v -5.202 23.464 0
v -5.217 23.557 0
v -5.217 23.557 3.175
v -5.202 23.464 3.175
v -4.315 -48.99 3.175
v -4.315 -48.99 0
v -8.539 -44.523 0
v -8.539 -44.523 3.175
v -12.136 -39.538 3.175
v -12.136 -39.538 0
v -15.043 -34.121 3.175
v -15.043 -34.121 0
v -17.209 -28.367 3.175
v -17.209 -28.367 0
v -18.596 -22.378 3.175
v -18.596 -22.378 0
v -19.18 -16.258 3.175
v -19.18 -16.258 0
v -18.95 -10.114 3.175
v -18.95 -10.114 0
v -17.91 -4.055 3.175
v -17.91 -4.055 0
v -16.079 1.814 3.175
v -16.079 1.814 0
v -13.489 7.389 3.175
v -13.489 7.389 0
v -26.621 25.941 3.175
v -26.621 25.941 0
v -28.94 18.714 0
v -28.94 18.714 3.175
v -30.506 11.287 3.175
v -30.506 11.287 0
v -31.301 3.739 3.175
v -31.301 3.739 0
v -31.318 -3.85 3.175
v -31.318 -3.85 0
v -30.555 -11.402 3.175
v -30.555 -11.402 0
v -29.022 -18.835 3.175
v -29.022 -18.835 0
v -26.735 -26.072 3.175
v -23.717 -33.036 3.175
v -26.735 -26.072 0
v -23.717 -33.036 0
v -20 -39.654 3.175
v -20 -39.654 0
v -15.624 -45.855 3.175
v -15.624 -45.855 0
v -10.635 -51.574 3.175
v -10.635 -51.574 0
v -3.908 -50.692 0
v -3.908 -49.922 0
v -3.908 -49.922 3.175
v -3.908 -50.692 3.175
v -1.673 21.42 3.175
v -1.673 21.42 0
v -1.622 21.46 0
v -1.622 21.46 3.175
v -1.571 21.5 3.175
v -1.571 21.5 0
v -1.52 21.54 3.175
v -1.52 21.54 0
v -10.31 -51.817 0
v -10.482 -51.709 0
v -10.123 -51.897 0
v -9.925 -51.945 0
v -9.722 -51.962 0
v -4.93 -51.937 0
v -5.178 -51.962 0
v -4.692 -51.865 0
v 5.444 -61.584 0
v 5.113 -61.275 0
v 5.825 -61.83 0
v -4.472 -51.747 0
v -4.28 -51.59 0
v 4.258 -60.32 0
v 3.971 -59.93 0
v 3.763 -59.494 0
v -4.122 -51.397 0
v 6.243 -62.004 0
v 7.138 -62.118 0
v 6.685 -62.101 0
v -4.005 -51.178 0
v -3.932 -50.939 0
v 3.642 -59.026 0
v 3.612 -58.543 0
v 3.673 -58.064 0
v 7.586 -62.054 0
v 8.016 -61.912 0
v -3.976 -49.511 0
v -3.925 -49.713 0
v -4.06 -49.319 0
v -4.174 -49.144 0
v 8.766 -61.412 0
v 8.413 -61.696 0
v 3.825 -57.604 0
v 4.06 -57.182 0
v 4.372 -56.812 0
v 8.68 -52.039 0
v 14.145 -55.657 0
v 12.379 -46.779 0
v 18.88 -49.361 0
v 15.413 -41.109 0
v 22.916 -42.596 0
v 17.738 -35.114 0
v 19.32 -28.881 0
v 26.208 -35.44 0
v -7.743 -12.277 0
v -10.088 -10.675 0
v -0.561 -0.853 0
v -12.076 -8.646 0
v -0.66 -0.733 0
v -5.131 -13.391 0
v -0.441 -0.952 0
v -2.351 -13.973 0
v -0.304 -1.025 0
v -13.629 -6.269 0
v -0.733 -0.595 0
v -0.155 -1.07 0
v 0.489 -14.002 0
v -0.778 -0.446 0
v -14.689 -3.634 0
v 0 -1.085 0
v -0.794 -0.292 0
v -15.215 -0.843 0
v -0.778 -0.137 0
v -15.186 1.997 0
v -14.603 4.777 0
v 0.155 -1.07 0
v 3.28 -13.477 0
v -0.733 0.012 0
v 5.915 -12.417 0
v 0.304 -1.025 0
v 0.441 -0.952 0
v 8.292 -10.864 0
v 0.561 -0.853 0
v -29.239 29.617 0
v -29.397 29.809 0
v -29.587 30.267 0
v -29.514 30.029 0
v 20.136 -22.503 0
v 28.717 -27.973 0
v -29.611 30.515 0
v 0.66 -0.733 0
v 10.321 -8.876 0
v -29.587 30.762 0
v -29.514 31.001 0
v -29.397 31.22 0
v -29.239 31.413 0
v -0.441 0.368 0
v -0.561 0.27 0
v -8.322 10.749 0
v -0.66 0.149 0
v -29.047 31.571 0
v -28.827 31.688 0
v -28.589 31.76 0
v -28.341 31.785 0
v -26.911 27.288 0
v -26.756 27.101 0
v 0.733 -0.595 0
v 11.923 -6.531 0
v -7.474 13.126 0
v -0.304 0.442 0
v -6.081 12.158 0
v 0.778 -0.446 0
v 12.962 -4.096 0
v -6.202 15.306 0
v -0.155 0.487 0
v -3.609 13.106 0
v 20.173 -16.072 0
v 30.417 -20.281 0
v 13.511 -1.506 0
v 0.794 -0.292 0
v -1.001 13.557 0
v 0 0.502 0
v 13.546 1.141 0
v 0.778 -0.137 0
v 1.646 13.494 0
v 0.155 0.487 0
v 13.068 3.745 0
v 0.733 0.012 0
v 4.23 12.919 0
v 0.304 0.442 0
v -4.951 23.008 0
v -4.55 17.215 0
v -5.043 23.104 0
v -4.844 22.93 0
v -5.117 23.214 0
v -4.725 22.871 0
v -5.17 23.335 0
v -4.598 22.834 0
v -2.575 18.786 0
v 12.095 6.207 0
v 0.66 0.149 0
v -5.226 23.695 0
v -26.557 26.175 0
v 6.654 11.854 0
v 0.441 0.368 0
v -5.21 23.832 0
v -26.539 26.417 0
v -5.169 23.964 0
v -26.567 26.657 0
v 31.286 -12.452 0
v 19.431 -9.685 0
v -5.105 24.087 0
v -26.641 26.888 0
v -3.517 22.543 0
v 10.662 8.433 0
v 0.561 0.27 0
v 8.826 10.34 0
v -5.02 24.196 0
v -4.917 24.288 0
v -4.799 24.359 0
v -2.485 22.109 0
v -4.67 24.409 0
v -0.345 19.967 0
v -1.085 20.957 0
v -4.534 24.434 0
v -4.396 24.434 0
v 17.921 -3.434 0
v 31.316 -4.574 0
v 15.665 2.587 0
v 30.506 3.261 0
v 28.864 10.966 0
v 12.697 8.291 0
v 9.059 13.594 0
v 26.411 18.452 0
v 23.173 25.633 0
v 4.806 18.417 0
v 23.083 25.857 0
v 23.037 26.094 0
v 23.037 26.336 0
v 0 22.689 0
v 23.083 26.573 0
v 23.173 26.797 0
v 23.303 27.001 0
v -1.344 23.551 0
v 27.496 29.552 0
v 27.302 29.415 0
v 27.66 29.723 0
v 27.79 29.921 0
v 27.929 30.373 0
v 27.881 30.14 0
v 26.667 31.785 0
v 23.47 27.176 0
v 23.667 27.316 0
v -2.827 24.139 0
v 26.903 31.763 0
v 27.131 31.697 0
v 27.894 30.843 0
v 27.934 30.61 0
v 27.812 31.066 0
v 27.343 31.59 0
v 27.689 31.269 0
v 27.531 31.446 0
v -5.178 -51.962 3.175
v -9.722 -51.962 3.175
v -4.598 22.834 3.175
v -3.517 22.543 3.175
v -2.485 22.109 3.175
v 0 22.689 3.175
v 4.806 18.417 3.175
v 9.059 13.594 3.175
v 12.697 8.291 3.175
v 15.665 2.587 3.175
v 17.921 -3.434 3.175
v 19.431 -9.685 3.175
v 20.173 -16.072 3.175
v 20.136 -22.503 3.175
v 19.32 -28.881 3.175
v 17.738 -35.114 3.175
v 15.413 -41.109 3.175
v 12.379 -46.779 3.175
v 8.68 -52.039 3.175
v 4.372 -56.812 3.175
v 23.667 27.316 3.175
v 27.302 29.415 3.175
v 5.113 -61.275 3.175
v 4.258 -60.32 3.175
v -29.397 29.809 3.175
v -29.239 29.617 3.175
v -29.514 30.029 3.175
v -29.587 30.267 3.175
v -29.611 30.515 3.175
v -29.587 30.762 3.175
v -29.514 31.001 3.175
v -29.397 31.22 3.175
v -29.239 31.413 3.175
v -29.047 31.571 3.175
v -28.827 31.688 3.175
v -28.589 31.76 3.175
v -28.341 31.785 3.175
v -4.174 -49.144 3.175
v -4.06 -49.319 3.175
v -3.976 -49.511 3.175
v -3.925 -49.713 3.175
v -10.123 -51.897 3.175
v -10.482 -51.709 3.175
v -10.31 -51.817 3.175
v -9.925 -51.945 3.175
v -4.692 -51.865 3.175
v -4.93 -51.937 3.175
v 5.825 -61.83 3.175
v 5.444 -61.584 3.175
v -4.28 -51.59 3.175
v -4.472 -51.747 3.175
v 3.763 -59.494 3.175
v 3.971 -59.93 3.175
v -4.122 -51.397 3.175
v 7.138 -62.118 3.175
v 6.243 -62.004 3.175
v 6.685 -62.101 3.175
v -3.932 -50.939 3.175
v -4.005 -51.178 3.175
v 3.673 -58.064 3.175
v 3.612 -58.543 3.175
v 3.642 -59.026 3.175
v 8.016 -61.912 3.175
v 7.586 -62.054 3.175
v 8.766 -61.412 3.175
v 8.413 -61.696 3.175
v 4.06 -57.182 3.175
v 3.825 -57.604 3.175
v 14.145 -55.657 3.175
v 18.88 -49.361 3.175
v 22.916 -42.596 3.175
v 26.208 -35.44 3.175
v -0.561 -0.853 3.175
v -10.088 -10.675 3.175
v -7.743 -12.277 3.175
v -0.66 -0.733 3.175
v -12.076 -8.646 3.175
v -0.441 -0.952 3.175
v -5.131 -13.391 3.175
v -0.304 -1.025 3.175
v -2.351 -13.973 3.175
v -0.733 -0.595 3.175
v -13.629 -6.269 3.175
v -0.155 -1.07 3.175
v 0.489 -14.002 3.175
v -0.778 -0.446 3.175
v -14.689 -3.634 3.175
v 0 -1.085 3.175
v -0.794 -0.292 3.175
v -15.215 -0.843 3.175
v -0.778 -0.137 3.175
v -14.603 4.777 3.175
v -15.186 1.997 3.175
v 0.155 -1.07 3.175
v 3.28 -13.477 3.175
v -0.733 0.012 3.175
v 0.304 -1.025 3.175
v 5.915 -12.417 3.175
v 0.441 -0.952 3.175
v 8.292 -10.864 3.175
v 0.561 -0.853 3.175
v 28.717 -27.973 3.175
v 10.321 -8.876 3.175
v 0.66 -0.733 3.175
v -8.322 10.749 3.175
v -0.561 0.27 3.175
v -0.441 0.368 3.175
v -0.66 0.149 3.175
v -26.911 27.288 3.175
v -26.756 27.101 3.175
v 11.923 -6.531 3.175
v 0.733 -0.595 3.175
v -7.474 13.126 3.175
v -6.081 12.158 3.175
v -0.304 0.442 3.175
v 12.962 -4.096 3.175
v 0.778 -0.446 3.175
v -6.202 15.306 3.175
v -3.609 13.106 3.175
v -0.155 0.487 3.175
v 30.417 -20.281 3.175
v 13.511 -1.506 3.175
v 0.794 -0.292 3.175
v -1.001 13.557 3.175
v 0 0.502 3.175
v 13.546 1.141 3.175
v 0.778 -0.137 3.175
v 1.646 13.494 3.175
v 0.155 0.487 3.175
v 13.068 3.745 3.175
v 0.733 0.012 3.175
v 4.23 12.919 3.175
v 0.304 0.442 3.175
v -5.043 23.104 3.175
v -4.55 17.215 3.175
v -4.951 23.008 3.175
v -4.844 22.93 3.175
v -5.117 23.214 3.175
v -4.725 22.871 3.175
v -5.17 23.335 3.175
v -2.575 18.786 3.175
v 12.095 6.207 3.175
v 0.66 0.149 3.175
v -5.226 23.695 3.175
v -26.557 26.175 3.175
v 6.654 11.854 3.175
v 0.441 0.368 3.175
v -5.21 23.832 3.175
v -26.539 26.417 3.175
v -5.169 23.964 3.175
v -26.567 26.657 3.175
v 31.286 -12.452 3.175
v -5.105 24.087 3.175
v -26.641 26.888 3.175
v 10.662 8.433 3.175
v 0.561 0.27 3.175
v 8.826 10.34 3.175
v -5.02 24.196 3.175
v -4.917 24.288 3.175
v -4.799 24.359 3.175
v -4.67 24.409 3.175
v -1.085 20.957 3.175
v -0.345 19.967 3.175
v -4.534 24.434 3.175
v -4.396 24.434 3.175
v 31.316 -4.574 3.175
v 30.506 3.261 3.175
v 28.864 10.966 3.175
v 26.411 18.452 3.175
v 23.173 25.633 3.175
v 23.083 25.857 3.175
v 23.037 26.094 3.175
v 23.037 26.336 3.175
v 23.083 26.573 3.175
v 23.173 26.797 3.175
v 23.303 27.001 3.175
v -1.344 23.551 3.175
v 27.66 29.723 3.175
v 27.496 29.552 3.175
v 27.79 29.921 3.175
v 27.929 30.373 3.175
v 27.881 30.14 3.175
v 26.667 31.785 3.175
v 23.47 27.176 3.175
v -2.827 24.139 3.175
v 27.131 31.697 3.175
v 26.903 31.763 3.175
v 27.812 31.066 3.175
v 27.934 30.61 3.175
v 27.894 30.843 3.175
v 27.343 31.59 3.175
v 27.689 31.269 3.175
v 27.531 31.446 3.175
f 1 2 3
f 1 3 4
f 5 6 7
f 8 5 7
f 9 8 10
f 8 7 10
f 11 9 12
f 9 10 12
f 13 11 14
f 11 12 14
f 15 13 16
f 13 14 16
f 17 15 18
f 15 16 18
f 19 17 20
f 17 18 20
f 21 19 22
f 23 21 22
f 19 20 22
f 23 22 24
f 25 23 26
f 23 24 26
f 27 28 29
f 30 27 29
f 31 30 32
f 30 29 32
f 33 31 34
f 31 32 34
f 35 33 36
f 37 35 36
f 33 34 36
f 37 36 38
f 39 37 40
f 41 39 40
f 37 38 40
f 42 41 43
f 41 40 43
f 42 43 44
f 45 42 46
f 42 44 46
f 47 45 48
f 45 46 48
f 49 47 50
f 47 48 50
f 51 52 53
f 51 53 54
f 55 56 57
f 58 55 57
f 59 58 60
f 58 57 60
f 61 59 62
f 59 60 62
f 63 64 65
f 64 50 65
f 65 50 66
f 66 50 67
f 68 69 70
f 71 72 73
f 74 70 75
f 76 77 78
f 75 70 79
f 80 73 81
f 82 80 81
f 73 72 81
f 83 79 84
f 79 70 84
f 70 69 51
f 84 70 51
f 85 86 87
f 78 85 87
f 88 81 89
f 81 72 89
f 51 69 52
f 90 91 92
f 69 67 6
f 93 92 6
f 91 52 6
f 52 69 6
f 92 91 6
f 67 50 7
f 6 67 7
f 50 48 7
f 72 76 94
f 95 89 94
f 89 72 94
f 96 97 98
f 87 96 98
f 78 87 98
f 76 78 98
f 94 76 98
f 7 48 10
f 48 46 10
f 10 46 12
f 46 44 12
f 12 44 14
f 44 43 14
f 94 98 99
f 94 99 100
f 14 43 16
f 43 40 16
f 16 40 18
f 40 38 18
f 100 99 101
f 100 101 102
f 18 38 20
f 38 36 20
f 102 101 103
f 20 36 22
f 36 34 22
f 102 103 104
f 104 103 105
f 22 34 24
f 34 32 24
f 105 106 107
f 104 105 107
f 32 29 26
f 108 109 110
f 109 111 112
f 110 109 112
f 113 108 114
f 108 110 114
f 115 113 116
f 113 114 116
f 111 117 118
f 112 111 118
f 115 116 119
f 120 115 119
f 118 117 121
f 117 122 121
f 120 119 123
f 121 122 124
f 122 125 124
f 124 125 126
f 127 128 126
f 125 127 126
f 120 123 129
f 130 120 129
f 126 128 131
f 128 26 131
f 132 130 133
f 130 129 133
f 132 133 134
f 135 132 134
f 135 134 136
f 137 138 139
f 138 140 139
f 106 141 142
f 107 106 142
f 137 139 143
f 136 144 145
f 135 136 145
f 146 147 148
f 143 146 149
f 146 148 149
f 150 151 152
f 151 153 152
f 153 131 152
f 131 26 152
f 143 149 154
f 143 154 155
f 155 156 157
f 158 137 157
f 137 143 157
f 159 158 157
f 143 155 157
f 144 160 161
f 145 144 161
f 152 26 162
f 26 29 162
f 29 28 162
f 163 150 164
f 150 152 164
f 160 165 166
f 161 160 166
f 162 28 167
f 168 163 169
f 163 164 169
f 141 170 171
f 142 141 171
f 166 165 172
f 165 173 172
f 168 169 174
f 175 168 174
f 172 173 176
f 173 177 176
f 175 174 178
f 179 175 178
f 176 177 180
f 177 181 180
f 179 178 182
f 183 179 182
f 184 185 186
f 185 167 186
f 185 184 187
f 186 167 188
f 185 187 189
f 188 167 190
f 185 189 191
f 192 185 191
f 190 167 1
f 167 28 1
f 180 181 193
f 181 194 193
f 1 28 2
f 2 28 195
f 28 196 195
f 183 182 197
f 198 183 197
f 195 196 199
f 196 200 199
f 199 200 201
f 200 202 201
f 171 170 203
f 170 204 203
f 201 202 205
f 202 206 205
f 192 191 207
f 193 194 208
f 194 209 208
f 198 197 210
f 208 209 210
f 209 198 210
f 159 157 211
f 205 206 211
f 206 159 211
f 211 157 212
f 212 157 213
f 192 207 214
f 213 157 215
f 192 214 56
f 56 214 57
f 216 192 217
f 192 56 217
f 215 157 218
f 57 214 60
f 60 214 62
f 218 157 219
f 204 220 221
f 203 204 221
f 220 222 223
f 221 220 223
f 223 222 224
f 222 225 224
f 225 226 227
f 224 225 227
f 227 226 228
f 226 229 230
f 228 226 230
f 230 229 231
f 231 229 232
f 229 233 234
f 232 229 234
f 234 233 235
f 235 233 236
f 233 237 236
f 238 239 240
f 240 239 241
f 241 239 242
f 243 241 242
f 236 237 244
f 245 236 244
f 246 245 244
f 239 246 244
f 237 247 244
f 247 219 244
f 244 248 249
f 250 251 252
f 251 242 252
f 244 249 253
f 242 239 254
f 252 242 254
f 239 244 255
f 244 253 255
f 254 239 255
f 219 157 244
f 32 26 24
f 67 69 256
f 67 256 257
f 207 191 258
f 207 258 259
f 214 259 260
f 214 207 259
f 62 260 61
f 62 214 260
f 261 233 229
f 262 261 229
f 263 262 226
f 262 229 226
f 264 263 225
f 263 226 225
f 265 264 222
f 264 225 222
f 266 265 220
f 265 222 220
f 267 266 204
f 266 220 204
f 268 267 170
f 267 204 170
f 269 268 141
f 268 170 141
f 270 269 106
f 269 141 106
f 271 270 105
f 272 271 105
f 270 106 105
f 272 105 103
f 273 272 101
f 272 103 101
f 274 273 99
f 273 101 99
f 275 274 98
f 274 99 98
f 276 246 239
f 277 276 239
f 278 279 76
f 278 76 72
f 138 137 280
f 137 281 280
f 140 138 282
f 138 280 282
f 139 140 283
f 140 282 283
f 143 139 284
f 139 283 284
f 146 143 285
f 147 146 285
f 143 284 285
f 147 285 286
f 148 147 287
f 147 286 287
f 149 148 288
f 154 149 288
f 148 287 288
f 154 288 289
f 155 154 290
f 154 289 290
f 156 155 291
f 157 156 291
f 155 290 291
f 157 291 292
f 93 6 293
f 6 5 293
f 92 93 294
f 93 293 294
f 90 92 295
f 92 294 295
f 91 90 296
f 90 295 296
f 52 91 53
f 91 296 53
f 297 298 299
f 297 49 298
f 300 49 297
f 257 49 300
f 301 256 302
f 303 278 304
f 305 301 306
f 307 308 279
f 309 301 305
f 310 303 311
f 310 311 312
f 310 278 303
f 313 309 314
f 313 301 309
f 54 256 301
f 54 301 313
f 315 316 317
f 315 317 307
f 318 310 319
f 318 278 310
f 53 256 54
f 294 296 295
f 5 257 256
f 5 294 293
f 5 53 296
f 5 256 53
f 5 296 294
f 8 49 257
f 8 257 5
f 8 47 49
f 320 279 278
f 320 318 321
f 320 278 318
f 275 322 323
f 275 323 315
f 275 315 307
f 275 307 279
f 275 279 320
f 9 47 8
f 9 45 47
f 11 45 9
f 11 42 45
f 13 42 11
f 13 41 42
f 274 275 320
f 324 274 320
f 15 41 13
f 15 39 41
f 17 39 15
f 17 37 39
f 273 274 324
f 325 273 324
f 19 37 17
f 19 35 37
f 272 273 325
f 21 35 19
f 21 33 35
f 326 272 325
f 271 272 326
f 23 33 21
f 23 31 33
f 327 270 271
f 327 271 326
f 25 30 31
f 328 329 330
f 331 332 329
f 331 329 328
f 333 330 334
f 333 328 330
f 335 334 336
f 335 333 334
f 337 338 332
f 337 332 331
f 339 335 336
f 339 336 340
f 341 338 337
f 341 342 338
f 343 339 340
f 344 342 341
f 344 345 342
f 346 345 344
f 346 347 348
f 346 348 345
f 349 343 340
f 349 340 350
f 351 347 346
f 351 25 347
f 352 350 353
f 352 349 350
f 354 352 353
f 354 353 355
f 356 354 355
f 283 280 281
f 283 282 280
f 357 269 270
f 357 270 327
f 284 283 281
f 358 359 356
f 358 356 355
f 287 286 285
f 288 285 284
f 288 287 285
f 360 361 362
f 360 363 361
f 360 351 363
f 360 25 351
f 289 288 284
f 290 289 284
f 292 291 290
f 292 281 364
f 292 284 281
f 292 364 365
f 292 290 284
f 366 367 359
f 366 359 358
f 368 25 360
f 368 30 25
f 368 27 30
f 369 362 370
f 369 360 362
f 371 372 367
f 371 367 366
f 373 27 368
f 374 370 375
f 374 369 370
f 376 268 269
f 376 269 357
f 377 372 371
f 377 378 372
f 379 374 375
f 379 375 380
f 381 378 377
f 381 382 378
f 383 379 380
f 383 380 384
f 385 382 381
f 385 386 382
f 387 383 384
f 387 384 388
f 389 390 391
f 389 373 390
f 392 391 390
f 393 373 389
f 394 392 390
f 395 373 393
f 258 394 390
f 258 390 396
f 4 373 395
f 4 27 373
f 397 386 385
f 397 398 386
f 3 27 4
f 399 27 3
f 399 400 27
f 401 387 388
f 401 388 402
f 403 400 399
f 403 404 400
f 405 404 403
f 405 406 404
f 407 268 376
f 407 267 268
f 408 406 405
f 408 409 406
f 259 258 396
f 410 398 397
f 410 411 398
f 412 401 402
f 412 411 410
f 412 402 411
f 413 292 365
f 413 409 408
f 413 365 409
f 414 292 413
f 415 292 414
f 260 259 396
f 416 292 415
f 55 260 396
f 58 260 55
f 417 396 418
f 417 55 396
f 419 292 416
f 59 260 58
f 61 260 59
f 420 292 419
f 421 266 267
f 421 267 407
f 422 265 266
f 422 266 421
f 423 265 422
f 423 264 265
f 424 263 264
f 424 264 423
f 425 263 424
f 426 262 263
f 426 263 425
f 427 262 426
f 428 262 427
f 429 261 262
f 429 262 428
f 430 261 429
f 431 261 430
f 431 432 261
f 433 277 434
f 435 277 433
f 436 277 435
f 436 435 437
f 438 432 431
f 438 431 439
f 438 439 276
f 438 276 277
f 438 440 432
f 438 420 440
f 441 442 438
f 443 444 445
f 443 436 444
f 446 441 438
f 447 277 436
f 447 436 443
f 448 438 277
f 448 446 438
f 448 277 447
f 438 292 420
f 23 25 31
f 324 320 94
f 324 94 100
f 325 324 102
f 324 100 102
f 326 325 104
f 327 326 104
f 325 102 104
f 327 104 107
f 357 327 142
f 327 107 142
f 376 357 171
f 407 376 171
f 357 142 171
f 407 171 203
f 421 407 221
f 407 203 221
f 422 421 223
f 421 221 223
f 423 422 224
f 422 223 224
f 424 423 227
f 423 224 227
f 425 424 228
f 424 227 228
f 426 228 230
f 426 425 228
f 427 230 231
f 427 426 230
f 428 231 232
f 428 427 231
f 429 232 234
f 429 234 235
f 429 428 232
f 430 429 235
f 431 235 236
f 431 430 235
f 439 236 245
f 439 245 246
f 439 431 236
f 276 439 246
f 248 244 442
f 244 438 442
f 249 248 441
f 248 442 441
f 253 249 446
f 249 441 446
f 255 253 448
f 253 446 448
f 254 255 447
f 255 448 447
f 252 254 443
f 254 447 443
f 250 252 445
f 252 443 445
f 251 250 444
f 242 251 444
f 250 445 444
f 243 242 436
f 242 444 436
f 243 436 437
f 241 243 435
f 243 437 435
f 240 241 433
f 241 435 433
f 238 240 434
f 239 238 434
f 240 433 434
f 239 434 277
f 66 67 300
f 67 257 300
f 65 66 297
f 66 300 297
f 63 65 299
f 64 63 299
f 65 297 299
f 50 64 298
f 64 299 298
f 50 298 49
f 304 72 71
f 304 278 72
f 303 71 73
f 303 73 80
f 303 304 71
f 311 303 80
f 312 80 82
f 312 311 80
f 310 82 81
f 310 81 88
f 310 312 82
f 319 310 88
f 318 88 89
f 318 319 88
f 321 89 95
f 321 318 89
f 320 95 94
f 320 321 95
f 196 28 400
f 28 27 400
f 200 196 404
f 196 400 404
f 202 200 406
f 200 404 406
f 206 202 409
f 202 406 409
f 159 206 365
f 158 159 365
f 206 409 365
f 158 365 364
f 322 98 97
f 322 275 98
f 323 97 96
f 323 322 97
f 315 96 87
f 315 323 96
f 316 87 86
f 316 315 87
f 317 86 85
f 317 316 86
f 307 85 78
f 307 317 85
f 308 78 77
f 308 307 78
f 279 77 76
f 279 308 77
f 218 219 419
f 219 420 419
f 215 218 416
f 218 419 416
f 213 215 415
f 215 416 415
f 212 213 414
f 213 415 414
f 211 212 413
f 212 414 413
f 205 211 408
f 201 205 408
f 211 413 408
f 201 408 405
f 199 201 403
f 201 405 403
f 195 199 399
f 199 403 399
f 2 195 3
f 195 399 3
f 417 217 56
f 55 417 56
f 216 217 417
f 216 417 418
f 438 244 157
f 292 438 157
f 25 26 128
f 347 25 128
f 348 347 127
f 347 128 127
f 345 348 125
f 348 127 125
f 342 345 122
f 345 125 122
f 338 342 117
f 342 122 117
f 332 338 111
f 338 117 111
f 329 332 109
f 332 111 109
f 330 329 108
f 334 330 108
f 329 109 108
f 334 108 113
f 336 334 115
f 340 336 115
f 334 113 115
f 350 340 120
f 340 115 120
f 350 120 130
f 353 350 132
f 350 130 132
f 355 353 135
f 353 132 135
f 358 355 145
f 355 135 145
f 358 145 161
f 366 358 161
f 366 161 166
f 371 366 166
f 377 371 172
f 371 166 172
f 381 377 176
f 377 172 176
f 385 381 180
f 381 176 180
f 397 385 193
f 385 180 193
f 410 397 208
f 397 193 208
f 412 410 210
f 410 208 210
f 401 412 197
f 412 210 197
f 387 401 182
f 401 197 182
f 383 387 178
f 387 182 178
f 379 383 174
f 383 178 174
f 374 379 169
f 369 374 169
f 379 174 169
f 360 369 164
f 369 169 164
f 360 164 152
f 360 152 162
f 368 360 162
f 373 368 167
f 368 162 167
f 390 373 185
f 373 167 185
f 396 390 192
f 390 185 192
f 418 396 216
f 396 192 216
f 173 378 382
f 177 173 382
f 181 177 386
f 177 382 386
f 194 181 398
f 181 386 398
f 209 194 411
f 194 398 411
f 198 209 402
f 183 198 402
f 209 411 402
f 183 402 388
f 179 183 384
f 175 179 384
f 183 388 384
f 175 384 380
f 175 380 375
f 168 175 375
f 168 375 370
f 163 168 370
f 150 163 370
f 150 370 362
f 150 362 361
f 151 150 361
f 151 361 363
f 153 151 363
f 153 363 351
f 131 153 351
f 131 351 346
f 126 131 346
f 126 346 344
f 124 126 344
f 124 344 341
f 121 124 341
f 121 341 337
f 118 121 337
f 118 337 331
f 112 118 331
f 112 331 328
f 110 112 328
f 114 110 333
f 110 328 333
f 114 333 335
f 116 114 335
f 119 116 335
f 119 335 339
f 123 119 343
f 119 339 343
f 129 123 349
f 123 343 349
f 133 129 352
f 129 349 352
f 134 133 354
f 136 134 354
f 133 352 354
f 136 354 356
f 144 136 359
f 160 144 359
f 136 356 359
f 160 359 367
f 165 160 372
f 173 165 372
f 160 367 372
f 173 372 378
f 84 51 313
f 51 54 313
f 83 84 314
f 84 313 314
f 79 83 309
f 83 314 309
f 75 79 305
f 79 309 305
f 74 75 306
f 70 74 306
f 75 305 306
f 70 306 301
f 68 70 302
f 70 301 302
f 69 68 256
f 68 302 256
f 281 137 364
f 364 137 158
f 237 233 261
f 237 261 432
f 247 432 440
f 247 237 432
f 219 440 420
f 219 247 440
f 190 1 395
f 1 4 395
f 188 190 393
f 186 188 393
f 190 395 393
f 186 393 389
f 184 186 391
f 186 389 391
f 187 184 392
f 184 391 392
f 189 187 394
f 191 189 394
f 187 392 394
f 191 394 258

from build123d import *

# Parameters (mm, degrees)
F2_DEPTH  = 3.175
F1_R      = 13.594235125
F4_DEPTH  = 3.175
F6_DEPTH  = 3.175
F7_R      = 1.27
F8_R      = 0.762
F9_R      = 0.79375
F10_DEPTH = 3.176
F11_R     = 2.54


with BuildPart() as f2:
    # F1 (on face) → F2 (new body)
    with BuildSketch(Plane.XY):
        with BuildLine():
            Line((31.4070041795, 31.7847206253), (-31.4070041795, 31.7847206253))
            Line((-31.4070041795, 31.7847206253), (-26.3270041795, 26.7047206253))
            ThreePointArc((-26.3270041795, 26.7047206253), (-29.4018182362, -17.3120874939), (-6.8377400748, -55.230371411))
            Line((-6.8377400748, -55.230371411), (-2.5995985028, -50.5016658783))
            ThreePointArc((-2.5995985028, -50.5016658783), (-19.1698848855, -13.2713854087), (0, 22.6894778752))
            ThreePointArc((0, 22.6894778752), (20.2259208041, -17.2835334321), (2.6025941293, -58.4702772006))
            Line((2.6025941293, -58.4702772006), (6.8377400748, -63.2016658783))
            ThreePointArc((6.8377400748, -63.2016658783), (30.2976275511, -20.9804187613), (22.6081860771, 26.7047206253))
            Line((22.6081860771, 26.7047206253), (31.4070041795, 31.7847206253))
        make_face()
    extrude(amount=F2_DEPTH)



with BuildPart() as f2b:
    # F1 (on face) → F2, piece 2 (new body)
    with BuildSketch(Plane.XY):
        Circle(F1_R)
    extrude(amount=F2_DEPTH)


with BuildPart() as f2_1:
    add(f2.part)

    add(f2b.part)  # F4 merges F2b
    # F3 (on face) → F4 (join, through all)
    with BuildSketch(Plane.XY):
        with BuildLine():
            Line((-5.2498336251, 24.2303351167), (-13.4892699034, 7.3891431238))
            ThreePointArc((-13.4892699034, 7.3891431238), (-7.7433725843, -12.2768772355), (11.922647775, -6.5309799163))
            Line((11.922647775, -6.5309799163), (9.7925756653, -5.3641704599))
            ThreePointArc((9.7925756653, -5.3641704599), (-7.8384100149, 2.474239555), (0, 20.1052252351))
            Line((0, 20.1052252351), (-5.2498336251, 24.2303351167))
        make_face()
    extrude(amount=F4_DEPTH)

    # F5 (on face) → F6 (cut, through all)
    with BuildSketch(Plane.XY):
        Polygon((-3.9079916846, -49.3622544157), (-3.9079916846, -51.9615052849), (-10.2579916846, -51.9615052849), (-10.2579916846, -62.6840499783), (0, -56.9217726588), (-2.6145169004, -45.902473209), align=None)
        with BuildLine():
            Line((0, 19.5056907833), (0, 22.6894778752))
            ThreePointArc((0, 22.6894778752), (-2.5244121089, 24.0453912744), (-5.359141473, 24.4642791758))
            Line((-5.359141473, 24.4642791758), (-5.1168514161, 22.9205221383))
            ThreePointArc((-5.1168514161, 22.9205221383), (-3.237454866, 22.4415366371), (-1.5200501793, 21.5403820193))
            Line((-1.5200501793, 21.5403820193), (0, 19.5056907833))
        make_face()
    extrude(amount=F6_DEPTH, mode=Mode.SUBTRACT)

    # F7
    f7_edges = [f2_1.edges().sort_by_distance(p)[0] for p in [
        (-31.407004, 31.784721, 1.5875),
        (-26.327004, 26.704721, 1.5875),
        (31.407004, 31.784721, 1.5875),
        (22.608186, 26.704721, 1.5875),
        (-3.907992, -49.362254, 1.5875),
        (-3.907992, -51.961505, 1.5875),
        (-10.257992, -51.961505, 1.5875),
    ]]
    fillet(f7_edges, radius=F7_R)

    # F8
    f8_edges = [f2_1.edges().sort_by_distance(p)[0] for p in [
        (-5.359141, 24.464279, 1.5875),
        (-5.116851, 22.920522, 1.5875),
    ]]
    fillet(f8_edges, radius=F8_R)

    # F9 (on face) → F10 (cut, through all)
    with BuildSketch(Plane.XY.offset(3.175)):
        with Locations((0, -0.2915779182)):
            Circle(F9_R)
    extrude(amount=-F10_DEPTH, mode=Mode.SUBTRACT)

    # F11
    f11_edges = [f2_1.edges().sort_by_distance(p)[0] for p in [
        (2.602594, -58.470277, 1.5875),
        (6.83774, -63.201666, 1.5875),
    ]]
    fillet(f11_edges, radius=F11_R)


solid = f2_1.part
